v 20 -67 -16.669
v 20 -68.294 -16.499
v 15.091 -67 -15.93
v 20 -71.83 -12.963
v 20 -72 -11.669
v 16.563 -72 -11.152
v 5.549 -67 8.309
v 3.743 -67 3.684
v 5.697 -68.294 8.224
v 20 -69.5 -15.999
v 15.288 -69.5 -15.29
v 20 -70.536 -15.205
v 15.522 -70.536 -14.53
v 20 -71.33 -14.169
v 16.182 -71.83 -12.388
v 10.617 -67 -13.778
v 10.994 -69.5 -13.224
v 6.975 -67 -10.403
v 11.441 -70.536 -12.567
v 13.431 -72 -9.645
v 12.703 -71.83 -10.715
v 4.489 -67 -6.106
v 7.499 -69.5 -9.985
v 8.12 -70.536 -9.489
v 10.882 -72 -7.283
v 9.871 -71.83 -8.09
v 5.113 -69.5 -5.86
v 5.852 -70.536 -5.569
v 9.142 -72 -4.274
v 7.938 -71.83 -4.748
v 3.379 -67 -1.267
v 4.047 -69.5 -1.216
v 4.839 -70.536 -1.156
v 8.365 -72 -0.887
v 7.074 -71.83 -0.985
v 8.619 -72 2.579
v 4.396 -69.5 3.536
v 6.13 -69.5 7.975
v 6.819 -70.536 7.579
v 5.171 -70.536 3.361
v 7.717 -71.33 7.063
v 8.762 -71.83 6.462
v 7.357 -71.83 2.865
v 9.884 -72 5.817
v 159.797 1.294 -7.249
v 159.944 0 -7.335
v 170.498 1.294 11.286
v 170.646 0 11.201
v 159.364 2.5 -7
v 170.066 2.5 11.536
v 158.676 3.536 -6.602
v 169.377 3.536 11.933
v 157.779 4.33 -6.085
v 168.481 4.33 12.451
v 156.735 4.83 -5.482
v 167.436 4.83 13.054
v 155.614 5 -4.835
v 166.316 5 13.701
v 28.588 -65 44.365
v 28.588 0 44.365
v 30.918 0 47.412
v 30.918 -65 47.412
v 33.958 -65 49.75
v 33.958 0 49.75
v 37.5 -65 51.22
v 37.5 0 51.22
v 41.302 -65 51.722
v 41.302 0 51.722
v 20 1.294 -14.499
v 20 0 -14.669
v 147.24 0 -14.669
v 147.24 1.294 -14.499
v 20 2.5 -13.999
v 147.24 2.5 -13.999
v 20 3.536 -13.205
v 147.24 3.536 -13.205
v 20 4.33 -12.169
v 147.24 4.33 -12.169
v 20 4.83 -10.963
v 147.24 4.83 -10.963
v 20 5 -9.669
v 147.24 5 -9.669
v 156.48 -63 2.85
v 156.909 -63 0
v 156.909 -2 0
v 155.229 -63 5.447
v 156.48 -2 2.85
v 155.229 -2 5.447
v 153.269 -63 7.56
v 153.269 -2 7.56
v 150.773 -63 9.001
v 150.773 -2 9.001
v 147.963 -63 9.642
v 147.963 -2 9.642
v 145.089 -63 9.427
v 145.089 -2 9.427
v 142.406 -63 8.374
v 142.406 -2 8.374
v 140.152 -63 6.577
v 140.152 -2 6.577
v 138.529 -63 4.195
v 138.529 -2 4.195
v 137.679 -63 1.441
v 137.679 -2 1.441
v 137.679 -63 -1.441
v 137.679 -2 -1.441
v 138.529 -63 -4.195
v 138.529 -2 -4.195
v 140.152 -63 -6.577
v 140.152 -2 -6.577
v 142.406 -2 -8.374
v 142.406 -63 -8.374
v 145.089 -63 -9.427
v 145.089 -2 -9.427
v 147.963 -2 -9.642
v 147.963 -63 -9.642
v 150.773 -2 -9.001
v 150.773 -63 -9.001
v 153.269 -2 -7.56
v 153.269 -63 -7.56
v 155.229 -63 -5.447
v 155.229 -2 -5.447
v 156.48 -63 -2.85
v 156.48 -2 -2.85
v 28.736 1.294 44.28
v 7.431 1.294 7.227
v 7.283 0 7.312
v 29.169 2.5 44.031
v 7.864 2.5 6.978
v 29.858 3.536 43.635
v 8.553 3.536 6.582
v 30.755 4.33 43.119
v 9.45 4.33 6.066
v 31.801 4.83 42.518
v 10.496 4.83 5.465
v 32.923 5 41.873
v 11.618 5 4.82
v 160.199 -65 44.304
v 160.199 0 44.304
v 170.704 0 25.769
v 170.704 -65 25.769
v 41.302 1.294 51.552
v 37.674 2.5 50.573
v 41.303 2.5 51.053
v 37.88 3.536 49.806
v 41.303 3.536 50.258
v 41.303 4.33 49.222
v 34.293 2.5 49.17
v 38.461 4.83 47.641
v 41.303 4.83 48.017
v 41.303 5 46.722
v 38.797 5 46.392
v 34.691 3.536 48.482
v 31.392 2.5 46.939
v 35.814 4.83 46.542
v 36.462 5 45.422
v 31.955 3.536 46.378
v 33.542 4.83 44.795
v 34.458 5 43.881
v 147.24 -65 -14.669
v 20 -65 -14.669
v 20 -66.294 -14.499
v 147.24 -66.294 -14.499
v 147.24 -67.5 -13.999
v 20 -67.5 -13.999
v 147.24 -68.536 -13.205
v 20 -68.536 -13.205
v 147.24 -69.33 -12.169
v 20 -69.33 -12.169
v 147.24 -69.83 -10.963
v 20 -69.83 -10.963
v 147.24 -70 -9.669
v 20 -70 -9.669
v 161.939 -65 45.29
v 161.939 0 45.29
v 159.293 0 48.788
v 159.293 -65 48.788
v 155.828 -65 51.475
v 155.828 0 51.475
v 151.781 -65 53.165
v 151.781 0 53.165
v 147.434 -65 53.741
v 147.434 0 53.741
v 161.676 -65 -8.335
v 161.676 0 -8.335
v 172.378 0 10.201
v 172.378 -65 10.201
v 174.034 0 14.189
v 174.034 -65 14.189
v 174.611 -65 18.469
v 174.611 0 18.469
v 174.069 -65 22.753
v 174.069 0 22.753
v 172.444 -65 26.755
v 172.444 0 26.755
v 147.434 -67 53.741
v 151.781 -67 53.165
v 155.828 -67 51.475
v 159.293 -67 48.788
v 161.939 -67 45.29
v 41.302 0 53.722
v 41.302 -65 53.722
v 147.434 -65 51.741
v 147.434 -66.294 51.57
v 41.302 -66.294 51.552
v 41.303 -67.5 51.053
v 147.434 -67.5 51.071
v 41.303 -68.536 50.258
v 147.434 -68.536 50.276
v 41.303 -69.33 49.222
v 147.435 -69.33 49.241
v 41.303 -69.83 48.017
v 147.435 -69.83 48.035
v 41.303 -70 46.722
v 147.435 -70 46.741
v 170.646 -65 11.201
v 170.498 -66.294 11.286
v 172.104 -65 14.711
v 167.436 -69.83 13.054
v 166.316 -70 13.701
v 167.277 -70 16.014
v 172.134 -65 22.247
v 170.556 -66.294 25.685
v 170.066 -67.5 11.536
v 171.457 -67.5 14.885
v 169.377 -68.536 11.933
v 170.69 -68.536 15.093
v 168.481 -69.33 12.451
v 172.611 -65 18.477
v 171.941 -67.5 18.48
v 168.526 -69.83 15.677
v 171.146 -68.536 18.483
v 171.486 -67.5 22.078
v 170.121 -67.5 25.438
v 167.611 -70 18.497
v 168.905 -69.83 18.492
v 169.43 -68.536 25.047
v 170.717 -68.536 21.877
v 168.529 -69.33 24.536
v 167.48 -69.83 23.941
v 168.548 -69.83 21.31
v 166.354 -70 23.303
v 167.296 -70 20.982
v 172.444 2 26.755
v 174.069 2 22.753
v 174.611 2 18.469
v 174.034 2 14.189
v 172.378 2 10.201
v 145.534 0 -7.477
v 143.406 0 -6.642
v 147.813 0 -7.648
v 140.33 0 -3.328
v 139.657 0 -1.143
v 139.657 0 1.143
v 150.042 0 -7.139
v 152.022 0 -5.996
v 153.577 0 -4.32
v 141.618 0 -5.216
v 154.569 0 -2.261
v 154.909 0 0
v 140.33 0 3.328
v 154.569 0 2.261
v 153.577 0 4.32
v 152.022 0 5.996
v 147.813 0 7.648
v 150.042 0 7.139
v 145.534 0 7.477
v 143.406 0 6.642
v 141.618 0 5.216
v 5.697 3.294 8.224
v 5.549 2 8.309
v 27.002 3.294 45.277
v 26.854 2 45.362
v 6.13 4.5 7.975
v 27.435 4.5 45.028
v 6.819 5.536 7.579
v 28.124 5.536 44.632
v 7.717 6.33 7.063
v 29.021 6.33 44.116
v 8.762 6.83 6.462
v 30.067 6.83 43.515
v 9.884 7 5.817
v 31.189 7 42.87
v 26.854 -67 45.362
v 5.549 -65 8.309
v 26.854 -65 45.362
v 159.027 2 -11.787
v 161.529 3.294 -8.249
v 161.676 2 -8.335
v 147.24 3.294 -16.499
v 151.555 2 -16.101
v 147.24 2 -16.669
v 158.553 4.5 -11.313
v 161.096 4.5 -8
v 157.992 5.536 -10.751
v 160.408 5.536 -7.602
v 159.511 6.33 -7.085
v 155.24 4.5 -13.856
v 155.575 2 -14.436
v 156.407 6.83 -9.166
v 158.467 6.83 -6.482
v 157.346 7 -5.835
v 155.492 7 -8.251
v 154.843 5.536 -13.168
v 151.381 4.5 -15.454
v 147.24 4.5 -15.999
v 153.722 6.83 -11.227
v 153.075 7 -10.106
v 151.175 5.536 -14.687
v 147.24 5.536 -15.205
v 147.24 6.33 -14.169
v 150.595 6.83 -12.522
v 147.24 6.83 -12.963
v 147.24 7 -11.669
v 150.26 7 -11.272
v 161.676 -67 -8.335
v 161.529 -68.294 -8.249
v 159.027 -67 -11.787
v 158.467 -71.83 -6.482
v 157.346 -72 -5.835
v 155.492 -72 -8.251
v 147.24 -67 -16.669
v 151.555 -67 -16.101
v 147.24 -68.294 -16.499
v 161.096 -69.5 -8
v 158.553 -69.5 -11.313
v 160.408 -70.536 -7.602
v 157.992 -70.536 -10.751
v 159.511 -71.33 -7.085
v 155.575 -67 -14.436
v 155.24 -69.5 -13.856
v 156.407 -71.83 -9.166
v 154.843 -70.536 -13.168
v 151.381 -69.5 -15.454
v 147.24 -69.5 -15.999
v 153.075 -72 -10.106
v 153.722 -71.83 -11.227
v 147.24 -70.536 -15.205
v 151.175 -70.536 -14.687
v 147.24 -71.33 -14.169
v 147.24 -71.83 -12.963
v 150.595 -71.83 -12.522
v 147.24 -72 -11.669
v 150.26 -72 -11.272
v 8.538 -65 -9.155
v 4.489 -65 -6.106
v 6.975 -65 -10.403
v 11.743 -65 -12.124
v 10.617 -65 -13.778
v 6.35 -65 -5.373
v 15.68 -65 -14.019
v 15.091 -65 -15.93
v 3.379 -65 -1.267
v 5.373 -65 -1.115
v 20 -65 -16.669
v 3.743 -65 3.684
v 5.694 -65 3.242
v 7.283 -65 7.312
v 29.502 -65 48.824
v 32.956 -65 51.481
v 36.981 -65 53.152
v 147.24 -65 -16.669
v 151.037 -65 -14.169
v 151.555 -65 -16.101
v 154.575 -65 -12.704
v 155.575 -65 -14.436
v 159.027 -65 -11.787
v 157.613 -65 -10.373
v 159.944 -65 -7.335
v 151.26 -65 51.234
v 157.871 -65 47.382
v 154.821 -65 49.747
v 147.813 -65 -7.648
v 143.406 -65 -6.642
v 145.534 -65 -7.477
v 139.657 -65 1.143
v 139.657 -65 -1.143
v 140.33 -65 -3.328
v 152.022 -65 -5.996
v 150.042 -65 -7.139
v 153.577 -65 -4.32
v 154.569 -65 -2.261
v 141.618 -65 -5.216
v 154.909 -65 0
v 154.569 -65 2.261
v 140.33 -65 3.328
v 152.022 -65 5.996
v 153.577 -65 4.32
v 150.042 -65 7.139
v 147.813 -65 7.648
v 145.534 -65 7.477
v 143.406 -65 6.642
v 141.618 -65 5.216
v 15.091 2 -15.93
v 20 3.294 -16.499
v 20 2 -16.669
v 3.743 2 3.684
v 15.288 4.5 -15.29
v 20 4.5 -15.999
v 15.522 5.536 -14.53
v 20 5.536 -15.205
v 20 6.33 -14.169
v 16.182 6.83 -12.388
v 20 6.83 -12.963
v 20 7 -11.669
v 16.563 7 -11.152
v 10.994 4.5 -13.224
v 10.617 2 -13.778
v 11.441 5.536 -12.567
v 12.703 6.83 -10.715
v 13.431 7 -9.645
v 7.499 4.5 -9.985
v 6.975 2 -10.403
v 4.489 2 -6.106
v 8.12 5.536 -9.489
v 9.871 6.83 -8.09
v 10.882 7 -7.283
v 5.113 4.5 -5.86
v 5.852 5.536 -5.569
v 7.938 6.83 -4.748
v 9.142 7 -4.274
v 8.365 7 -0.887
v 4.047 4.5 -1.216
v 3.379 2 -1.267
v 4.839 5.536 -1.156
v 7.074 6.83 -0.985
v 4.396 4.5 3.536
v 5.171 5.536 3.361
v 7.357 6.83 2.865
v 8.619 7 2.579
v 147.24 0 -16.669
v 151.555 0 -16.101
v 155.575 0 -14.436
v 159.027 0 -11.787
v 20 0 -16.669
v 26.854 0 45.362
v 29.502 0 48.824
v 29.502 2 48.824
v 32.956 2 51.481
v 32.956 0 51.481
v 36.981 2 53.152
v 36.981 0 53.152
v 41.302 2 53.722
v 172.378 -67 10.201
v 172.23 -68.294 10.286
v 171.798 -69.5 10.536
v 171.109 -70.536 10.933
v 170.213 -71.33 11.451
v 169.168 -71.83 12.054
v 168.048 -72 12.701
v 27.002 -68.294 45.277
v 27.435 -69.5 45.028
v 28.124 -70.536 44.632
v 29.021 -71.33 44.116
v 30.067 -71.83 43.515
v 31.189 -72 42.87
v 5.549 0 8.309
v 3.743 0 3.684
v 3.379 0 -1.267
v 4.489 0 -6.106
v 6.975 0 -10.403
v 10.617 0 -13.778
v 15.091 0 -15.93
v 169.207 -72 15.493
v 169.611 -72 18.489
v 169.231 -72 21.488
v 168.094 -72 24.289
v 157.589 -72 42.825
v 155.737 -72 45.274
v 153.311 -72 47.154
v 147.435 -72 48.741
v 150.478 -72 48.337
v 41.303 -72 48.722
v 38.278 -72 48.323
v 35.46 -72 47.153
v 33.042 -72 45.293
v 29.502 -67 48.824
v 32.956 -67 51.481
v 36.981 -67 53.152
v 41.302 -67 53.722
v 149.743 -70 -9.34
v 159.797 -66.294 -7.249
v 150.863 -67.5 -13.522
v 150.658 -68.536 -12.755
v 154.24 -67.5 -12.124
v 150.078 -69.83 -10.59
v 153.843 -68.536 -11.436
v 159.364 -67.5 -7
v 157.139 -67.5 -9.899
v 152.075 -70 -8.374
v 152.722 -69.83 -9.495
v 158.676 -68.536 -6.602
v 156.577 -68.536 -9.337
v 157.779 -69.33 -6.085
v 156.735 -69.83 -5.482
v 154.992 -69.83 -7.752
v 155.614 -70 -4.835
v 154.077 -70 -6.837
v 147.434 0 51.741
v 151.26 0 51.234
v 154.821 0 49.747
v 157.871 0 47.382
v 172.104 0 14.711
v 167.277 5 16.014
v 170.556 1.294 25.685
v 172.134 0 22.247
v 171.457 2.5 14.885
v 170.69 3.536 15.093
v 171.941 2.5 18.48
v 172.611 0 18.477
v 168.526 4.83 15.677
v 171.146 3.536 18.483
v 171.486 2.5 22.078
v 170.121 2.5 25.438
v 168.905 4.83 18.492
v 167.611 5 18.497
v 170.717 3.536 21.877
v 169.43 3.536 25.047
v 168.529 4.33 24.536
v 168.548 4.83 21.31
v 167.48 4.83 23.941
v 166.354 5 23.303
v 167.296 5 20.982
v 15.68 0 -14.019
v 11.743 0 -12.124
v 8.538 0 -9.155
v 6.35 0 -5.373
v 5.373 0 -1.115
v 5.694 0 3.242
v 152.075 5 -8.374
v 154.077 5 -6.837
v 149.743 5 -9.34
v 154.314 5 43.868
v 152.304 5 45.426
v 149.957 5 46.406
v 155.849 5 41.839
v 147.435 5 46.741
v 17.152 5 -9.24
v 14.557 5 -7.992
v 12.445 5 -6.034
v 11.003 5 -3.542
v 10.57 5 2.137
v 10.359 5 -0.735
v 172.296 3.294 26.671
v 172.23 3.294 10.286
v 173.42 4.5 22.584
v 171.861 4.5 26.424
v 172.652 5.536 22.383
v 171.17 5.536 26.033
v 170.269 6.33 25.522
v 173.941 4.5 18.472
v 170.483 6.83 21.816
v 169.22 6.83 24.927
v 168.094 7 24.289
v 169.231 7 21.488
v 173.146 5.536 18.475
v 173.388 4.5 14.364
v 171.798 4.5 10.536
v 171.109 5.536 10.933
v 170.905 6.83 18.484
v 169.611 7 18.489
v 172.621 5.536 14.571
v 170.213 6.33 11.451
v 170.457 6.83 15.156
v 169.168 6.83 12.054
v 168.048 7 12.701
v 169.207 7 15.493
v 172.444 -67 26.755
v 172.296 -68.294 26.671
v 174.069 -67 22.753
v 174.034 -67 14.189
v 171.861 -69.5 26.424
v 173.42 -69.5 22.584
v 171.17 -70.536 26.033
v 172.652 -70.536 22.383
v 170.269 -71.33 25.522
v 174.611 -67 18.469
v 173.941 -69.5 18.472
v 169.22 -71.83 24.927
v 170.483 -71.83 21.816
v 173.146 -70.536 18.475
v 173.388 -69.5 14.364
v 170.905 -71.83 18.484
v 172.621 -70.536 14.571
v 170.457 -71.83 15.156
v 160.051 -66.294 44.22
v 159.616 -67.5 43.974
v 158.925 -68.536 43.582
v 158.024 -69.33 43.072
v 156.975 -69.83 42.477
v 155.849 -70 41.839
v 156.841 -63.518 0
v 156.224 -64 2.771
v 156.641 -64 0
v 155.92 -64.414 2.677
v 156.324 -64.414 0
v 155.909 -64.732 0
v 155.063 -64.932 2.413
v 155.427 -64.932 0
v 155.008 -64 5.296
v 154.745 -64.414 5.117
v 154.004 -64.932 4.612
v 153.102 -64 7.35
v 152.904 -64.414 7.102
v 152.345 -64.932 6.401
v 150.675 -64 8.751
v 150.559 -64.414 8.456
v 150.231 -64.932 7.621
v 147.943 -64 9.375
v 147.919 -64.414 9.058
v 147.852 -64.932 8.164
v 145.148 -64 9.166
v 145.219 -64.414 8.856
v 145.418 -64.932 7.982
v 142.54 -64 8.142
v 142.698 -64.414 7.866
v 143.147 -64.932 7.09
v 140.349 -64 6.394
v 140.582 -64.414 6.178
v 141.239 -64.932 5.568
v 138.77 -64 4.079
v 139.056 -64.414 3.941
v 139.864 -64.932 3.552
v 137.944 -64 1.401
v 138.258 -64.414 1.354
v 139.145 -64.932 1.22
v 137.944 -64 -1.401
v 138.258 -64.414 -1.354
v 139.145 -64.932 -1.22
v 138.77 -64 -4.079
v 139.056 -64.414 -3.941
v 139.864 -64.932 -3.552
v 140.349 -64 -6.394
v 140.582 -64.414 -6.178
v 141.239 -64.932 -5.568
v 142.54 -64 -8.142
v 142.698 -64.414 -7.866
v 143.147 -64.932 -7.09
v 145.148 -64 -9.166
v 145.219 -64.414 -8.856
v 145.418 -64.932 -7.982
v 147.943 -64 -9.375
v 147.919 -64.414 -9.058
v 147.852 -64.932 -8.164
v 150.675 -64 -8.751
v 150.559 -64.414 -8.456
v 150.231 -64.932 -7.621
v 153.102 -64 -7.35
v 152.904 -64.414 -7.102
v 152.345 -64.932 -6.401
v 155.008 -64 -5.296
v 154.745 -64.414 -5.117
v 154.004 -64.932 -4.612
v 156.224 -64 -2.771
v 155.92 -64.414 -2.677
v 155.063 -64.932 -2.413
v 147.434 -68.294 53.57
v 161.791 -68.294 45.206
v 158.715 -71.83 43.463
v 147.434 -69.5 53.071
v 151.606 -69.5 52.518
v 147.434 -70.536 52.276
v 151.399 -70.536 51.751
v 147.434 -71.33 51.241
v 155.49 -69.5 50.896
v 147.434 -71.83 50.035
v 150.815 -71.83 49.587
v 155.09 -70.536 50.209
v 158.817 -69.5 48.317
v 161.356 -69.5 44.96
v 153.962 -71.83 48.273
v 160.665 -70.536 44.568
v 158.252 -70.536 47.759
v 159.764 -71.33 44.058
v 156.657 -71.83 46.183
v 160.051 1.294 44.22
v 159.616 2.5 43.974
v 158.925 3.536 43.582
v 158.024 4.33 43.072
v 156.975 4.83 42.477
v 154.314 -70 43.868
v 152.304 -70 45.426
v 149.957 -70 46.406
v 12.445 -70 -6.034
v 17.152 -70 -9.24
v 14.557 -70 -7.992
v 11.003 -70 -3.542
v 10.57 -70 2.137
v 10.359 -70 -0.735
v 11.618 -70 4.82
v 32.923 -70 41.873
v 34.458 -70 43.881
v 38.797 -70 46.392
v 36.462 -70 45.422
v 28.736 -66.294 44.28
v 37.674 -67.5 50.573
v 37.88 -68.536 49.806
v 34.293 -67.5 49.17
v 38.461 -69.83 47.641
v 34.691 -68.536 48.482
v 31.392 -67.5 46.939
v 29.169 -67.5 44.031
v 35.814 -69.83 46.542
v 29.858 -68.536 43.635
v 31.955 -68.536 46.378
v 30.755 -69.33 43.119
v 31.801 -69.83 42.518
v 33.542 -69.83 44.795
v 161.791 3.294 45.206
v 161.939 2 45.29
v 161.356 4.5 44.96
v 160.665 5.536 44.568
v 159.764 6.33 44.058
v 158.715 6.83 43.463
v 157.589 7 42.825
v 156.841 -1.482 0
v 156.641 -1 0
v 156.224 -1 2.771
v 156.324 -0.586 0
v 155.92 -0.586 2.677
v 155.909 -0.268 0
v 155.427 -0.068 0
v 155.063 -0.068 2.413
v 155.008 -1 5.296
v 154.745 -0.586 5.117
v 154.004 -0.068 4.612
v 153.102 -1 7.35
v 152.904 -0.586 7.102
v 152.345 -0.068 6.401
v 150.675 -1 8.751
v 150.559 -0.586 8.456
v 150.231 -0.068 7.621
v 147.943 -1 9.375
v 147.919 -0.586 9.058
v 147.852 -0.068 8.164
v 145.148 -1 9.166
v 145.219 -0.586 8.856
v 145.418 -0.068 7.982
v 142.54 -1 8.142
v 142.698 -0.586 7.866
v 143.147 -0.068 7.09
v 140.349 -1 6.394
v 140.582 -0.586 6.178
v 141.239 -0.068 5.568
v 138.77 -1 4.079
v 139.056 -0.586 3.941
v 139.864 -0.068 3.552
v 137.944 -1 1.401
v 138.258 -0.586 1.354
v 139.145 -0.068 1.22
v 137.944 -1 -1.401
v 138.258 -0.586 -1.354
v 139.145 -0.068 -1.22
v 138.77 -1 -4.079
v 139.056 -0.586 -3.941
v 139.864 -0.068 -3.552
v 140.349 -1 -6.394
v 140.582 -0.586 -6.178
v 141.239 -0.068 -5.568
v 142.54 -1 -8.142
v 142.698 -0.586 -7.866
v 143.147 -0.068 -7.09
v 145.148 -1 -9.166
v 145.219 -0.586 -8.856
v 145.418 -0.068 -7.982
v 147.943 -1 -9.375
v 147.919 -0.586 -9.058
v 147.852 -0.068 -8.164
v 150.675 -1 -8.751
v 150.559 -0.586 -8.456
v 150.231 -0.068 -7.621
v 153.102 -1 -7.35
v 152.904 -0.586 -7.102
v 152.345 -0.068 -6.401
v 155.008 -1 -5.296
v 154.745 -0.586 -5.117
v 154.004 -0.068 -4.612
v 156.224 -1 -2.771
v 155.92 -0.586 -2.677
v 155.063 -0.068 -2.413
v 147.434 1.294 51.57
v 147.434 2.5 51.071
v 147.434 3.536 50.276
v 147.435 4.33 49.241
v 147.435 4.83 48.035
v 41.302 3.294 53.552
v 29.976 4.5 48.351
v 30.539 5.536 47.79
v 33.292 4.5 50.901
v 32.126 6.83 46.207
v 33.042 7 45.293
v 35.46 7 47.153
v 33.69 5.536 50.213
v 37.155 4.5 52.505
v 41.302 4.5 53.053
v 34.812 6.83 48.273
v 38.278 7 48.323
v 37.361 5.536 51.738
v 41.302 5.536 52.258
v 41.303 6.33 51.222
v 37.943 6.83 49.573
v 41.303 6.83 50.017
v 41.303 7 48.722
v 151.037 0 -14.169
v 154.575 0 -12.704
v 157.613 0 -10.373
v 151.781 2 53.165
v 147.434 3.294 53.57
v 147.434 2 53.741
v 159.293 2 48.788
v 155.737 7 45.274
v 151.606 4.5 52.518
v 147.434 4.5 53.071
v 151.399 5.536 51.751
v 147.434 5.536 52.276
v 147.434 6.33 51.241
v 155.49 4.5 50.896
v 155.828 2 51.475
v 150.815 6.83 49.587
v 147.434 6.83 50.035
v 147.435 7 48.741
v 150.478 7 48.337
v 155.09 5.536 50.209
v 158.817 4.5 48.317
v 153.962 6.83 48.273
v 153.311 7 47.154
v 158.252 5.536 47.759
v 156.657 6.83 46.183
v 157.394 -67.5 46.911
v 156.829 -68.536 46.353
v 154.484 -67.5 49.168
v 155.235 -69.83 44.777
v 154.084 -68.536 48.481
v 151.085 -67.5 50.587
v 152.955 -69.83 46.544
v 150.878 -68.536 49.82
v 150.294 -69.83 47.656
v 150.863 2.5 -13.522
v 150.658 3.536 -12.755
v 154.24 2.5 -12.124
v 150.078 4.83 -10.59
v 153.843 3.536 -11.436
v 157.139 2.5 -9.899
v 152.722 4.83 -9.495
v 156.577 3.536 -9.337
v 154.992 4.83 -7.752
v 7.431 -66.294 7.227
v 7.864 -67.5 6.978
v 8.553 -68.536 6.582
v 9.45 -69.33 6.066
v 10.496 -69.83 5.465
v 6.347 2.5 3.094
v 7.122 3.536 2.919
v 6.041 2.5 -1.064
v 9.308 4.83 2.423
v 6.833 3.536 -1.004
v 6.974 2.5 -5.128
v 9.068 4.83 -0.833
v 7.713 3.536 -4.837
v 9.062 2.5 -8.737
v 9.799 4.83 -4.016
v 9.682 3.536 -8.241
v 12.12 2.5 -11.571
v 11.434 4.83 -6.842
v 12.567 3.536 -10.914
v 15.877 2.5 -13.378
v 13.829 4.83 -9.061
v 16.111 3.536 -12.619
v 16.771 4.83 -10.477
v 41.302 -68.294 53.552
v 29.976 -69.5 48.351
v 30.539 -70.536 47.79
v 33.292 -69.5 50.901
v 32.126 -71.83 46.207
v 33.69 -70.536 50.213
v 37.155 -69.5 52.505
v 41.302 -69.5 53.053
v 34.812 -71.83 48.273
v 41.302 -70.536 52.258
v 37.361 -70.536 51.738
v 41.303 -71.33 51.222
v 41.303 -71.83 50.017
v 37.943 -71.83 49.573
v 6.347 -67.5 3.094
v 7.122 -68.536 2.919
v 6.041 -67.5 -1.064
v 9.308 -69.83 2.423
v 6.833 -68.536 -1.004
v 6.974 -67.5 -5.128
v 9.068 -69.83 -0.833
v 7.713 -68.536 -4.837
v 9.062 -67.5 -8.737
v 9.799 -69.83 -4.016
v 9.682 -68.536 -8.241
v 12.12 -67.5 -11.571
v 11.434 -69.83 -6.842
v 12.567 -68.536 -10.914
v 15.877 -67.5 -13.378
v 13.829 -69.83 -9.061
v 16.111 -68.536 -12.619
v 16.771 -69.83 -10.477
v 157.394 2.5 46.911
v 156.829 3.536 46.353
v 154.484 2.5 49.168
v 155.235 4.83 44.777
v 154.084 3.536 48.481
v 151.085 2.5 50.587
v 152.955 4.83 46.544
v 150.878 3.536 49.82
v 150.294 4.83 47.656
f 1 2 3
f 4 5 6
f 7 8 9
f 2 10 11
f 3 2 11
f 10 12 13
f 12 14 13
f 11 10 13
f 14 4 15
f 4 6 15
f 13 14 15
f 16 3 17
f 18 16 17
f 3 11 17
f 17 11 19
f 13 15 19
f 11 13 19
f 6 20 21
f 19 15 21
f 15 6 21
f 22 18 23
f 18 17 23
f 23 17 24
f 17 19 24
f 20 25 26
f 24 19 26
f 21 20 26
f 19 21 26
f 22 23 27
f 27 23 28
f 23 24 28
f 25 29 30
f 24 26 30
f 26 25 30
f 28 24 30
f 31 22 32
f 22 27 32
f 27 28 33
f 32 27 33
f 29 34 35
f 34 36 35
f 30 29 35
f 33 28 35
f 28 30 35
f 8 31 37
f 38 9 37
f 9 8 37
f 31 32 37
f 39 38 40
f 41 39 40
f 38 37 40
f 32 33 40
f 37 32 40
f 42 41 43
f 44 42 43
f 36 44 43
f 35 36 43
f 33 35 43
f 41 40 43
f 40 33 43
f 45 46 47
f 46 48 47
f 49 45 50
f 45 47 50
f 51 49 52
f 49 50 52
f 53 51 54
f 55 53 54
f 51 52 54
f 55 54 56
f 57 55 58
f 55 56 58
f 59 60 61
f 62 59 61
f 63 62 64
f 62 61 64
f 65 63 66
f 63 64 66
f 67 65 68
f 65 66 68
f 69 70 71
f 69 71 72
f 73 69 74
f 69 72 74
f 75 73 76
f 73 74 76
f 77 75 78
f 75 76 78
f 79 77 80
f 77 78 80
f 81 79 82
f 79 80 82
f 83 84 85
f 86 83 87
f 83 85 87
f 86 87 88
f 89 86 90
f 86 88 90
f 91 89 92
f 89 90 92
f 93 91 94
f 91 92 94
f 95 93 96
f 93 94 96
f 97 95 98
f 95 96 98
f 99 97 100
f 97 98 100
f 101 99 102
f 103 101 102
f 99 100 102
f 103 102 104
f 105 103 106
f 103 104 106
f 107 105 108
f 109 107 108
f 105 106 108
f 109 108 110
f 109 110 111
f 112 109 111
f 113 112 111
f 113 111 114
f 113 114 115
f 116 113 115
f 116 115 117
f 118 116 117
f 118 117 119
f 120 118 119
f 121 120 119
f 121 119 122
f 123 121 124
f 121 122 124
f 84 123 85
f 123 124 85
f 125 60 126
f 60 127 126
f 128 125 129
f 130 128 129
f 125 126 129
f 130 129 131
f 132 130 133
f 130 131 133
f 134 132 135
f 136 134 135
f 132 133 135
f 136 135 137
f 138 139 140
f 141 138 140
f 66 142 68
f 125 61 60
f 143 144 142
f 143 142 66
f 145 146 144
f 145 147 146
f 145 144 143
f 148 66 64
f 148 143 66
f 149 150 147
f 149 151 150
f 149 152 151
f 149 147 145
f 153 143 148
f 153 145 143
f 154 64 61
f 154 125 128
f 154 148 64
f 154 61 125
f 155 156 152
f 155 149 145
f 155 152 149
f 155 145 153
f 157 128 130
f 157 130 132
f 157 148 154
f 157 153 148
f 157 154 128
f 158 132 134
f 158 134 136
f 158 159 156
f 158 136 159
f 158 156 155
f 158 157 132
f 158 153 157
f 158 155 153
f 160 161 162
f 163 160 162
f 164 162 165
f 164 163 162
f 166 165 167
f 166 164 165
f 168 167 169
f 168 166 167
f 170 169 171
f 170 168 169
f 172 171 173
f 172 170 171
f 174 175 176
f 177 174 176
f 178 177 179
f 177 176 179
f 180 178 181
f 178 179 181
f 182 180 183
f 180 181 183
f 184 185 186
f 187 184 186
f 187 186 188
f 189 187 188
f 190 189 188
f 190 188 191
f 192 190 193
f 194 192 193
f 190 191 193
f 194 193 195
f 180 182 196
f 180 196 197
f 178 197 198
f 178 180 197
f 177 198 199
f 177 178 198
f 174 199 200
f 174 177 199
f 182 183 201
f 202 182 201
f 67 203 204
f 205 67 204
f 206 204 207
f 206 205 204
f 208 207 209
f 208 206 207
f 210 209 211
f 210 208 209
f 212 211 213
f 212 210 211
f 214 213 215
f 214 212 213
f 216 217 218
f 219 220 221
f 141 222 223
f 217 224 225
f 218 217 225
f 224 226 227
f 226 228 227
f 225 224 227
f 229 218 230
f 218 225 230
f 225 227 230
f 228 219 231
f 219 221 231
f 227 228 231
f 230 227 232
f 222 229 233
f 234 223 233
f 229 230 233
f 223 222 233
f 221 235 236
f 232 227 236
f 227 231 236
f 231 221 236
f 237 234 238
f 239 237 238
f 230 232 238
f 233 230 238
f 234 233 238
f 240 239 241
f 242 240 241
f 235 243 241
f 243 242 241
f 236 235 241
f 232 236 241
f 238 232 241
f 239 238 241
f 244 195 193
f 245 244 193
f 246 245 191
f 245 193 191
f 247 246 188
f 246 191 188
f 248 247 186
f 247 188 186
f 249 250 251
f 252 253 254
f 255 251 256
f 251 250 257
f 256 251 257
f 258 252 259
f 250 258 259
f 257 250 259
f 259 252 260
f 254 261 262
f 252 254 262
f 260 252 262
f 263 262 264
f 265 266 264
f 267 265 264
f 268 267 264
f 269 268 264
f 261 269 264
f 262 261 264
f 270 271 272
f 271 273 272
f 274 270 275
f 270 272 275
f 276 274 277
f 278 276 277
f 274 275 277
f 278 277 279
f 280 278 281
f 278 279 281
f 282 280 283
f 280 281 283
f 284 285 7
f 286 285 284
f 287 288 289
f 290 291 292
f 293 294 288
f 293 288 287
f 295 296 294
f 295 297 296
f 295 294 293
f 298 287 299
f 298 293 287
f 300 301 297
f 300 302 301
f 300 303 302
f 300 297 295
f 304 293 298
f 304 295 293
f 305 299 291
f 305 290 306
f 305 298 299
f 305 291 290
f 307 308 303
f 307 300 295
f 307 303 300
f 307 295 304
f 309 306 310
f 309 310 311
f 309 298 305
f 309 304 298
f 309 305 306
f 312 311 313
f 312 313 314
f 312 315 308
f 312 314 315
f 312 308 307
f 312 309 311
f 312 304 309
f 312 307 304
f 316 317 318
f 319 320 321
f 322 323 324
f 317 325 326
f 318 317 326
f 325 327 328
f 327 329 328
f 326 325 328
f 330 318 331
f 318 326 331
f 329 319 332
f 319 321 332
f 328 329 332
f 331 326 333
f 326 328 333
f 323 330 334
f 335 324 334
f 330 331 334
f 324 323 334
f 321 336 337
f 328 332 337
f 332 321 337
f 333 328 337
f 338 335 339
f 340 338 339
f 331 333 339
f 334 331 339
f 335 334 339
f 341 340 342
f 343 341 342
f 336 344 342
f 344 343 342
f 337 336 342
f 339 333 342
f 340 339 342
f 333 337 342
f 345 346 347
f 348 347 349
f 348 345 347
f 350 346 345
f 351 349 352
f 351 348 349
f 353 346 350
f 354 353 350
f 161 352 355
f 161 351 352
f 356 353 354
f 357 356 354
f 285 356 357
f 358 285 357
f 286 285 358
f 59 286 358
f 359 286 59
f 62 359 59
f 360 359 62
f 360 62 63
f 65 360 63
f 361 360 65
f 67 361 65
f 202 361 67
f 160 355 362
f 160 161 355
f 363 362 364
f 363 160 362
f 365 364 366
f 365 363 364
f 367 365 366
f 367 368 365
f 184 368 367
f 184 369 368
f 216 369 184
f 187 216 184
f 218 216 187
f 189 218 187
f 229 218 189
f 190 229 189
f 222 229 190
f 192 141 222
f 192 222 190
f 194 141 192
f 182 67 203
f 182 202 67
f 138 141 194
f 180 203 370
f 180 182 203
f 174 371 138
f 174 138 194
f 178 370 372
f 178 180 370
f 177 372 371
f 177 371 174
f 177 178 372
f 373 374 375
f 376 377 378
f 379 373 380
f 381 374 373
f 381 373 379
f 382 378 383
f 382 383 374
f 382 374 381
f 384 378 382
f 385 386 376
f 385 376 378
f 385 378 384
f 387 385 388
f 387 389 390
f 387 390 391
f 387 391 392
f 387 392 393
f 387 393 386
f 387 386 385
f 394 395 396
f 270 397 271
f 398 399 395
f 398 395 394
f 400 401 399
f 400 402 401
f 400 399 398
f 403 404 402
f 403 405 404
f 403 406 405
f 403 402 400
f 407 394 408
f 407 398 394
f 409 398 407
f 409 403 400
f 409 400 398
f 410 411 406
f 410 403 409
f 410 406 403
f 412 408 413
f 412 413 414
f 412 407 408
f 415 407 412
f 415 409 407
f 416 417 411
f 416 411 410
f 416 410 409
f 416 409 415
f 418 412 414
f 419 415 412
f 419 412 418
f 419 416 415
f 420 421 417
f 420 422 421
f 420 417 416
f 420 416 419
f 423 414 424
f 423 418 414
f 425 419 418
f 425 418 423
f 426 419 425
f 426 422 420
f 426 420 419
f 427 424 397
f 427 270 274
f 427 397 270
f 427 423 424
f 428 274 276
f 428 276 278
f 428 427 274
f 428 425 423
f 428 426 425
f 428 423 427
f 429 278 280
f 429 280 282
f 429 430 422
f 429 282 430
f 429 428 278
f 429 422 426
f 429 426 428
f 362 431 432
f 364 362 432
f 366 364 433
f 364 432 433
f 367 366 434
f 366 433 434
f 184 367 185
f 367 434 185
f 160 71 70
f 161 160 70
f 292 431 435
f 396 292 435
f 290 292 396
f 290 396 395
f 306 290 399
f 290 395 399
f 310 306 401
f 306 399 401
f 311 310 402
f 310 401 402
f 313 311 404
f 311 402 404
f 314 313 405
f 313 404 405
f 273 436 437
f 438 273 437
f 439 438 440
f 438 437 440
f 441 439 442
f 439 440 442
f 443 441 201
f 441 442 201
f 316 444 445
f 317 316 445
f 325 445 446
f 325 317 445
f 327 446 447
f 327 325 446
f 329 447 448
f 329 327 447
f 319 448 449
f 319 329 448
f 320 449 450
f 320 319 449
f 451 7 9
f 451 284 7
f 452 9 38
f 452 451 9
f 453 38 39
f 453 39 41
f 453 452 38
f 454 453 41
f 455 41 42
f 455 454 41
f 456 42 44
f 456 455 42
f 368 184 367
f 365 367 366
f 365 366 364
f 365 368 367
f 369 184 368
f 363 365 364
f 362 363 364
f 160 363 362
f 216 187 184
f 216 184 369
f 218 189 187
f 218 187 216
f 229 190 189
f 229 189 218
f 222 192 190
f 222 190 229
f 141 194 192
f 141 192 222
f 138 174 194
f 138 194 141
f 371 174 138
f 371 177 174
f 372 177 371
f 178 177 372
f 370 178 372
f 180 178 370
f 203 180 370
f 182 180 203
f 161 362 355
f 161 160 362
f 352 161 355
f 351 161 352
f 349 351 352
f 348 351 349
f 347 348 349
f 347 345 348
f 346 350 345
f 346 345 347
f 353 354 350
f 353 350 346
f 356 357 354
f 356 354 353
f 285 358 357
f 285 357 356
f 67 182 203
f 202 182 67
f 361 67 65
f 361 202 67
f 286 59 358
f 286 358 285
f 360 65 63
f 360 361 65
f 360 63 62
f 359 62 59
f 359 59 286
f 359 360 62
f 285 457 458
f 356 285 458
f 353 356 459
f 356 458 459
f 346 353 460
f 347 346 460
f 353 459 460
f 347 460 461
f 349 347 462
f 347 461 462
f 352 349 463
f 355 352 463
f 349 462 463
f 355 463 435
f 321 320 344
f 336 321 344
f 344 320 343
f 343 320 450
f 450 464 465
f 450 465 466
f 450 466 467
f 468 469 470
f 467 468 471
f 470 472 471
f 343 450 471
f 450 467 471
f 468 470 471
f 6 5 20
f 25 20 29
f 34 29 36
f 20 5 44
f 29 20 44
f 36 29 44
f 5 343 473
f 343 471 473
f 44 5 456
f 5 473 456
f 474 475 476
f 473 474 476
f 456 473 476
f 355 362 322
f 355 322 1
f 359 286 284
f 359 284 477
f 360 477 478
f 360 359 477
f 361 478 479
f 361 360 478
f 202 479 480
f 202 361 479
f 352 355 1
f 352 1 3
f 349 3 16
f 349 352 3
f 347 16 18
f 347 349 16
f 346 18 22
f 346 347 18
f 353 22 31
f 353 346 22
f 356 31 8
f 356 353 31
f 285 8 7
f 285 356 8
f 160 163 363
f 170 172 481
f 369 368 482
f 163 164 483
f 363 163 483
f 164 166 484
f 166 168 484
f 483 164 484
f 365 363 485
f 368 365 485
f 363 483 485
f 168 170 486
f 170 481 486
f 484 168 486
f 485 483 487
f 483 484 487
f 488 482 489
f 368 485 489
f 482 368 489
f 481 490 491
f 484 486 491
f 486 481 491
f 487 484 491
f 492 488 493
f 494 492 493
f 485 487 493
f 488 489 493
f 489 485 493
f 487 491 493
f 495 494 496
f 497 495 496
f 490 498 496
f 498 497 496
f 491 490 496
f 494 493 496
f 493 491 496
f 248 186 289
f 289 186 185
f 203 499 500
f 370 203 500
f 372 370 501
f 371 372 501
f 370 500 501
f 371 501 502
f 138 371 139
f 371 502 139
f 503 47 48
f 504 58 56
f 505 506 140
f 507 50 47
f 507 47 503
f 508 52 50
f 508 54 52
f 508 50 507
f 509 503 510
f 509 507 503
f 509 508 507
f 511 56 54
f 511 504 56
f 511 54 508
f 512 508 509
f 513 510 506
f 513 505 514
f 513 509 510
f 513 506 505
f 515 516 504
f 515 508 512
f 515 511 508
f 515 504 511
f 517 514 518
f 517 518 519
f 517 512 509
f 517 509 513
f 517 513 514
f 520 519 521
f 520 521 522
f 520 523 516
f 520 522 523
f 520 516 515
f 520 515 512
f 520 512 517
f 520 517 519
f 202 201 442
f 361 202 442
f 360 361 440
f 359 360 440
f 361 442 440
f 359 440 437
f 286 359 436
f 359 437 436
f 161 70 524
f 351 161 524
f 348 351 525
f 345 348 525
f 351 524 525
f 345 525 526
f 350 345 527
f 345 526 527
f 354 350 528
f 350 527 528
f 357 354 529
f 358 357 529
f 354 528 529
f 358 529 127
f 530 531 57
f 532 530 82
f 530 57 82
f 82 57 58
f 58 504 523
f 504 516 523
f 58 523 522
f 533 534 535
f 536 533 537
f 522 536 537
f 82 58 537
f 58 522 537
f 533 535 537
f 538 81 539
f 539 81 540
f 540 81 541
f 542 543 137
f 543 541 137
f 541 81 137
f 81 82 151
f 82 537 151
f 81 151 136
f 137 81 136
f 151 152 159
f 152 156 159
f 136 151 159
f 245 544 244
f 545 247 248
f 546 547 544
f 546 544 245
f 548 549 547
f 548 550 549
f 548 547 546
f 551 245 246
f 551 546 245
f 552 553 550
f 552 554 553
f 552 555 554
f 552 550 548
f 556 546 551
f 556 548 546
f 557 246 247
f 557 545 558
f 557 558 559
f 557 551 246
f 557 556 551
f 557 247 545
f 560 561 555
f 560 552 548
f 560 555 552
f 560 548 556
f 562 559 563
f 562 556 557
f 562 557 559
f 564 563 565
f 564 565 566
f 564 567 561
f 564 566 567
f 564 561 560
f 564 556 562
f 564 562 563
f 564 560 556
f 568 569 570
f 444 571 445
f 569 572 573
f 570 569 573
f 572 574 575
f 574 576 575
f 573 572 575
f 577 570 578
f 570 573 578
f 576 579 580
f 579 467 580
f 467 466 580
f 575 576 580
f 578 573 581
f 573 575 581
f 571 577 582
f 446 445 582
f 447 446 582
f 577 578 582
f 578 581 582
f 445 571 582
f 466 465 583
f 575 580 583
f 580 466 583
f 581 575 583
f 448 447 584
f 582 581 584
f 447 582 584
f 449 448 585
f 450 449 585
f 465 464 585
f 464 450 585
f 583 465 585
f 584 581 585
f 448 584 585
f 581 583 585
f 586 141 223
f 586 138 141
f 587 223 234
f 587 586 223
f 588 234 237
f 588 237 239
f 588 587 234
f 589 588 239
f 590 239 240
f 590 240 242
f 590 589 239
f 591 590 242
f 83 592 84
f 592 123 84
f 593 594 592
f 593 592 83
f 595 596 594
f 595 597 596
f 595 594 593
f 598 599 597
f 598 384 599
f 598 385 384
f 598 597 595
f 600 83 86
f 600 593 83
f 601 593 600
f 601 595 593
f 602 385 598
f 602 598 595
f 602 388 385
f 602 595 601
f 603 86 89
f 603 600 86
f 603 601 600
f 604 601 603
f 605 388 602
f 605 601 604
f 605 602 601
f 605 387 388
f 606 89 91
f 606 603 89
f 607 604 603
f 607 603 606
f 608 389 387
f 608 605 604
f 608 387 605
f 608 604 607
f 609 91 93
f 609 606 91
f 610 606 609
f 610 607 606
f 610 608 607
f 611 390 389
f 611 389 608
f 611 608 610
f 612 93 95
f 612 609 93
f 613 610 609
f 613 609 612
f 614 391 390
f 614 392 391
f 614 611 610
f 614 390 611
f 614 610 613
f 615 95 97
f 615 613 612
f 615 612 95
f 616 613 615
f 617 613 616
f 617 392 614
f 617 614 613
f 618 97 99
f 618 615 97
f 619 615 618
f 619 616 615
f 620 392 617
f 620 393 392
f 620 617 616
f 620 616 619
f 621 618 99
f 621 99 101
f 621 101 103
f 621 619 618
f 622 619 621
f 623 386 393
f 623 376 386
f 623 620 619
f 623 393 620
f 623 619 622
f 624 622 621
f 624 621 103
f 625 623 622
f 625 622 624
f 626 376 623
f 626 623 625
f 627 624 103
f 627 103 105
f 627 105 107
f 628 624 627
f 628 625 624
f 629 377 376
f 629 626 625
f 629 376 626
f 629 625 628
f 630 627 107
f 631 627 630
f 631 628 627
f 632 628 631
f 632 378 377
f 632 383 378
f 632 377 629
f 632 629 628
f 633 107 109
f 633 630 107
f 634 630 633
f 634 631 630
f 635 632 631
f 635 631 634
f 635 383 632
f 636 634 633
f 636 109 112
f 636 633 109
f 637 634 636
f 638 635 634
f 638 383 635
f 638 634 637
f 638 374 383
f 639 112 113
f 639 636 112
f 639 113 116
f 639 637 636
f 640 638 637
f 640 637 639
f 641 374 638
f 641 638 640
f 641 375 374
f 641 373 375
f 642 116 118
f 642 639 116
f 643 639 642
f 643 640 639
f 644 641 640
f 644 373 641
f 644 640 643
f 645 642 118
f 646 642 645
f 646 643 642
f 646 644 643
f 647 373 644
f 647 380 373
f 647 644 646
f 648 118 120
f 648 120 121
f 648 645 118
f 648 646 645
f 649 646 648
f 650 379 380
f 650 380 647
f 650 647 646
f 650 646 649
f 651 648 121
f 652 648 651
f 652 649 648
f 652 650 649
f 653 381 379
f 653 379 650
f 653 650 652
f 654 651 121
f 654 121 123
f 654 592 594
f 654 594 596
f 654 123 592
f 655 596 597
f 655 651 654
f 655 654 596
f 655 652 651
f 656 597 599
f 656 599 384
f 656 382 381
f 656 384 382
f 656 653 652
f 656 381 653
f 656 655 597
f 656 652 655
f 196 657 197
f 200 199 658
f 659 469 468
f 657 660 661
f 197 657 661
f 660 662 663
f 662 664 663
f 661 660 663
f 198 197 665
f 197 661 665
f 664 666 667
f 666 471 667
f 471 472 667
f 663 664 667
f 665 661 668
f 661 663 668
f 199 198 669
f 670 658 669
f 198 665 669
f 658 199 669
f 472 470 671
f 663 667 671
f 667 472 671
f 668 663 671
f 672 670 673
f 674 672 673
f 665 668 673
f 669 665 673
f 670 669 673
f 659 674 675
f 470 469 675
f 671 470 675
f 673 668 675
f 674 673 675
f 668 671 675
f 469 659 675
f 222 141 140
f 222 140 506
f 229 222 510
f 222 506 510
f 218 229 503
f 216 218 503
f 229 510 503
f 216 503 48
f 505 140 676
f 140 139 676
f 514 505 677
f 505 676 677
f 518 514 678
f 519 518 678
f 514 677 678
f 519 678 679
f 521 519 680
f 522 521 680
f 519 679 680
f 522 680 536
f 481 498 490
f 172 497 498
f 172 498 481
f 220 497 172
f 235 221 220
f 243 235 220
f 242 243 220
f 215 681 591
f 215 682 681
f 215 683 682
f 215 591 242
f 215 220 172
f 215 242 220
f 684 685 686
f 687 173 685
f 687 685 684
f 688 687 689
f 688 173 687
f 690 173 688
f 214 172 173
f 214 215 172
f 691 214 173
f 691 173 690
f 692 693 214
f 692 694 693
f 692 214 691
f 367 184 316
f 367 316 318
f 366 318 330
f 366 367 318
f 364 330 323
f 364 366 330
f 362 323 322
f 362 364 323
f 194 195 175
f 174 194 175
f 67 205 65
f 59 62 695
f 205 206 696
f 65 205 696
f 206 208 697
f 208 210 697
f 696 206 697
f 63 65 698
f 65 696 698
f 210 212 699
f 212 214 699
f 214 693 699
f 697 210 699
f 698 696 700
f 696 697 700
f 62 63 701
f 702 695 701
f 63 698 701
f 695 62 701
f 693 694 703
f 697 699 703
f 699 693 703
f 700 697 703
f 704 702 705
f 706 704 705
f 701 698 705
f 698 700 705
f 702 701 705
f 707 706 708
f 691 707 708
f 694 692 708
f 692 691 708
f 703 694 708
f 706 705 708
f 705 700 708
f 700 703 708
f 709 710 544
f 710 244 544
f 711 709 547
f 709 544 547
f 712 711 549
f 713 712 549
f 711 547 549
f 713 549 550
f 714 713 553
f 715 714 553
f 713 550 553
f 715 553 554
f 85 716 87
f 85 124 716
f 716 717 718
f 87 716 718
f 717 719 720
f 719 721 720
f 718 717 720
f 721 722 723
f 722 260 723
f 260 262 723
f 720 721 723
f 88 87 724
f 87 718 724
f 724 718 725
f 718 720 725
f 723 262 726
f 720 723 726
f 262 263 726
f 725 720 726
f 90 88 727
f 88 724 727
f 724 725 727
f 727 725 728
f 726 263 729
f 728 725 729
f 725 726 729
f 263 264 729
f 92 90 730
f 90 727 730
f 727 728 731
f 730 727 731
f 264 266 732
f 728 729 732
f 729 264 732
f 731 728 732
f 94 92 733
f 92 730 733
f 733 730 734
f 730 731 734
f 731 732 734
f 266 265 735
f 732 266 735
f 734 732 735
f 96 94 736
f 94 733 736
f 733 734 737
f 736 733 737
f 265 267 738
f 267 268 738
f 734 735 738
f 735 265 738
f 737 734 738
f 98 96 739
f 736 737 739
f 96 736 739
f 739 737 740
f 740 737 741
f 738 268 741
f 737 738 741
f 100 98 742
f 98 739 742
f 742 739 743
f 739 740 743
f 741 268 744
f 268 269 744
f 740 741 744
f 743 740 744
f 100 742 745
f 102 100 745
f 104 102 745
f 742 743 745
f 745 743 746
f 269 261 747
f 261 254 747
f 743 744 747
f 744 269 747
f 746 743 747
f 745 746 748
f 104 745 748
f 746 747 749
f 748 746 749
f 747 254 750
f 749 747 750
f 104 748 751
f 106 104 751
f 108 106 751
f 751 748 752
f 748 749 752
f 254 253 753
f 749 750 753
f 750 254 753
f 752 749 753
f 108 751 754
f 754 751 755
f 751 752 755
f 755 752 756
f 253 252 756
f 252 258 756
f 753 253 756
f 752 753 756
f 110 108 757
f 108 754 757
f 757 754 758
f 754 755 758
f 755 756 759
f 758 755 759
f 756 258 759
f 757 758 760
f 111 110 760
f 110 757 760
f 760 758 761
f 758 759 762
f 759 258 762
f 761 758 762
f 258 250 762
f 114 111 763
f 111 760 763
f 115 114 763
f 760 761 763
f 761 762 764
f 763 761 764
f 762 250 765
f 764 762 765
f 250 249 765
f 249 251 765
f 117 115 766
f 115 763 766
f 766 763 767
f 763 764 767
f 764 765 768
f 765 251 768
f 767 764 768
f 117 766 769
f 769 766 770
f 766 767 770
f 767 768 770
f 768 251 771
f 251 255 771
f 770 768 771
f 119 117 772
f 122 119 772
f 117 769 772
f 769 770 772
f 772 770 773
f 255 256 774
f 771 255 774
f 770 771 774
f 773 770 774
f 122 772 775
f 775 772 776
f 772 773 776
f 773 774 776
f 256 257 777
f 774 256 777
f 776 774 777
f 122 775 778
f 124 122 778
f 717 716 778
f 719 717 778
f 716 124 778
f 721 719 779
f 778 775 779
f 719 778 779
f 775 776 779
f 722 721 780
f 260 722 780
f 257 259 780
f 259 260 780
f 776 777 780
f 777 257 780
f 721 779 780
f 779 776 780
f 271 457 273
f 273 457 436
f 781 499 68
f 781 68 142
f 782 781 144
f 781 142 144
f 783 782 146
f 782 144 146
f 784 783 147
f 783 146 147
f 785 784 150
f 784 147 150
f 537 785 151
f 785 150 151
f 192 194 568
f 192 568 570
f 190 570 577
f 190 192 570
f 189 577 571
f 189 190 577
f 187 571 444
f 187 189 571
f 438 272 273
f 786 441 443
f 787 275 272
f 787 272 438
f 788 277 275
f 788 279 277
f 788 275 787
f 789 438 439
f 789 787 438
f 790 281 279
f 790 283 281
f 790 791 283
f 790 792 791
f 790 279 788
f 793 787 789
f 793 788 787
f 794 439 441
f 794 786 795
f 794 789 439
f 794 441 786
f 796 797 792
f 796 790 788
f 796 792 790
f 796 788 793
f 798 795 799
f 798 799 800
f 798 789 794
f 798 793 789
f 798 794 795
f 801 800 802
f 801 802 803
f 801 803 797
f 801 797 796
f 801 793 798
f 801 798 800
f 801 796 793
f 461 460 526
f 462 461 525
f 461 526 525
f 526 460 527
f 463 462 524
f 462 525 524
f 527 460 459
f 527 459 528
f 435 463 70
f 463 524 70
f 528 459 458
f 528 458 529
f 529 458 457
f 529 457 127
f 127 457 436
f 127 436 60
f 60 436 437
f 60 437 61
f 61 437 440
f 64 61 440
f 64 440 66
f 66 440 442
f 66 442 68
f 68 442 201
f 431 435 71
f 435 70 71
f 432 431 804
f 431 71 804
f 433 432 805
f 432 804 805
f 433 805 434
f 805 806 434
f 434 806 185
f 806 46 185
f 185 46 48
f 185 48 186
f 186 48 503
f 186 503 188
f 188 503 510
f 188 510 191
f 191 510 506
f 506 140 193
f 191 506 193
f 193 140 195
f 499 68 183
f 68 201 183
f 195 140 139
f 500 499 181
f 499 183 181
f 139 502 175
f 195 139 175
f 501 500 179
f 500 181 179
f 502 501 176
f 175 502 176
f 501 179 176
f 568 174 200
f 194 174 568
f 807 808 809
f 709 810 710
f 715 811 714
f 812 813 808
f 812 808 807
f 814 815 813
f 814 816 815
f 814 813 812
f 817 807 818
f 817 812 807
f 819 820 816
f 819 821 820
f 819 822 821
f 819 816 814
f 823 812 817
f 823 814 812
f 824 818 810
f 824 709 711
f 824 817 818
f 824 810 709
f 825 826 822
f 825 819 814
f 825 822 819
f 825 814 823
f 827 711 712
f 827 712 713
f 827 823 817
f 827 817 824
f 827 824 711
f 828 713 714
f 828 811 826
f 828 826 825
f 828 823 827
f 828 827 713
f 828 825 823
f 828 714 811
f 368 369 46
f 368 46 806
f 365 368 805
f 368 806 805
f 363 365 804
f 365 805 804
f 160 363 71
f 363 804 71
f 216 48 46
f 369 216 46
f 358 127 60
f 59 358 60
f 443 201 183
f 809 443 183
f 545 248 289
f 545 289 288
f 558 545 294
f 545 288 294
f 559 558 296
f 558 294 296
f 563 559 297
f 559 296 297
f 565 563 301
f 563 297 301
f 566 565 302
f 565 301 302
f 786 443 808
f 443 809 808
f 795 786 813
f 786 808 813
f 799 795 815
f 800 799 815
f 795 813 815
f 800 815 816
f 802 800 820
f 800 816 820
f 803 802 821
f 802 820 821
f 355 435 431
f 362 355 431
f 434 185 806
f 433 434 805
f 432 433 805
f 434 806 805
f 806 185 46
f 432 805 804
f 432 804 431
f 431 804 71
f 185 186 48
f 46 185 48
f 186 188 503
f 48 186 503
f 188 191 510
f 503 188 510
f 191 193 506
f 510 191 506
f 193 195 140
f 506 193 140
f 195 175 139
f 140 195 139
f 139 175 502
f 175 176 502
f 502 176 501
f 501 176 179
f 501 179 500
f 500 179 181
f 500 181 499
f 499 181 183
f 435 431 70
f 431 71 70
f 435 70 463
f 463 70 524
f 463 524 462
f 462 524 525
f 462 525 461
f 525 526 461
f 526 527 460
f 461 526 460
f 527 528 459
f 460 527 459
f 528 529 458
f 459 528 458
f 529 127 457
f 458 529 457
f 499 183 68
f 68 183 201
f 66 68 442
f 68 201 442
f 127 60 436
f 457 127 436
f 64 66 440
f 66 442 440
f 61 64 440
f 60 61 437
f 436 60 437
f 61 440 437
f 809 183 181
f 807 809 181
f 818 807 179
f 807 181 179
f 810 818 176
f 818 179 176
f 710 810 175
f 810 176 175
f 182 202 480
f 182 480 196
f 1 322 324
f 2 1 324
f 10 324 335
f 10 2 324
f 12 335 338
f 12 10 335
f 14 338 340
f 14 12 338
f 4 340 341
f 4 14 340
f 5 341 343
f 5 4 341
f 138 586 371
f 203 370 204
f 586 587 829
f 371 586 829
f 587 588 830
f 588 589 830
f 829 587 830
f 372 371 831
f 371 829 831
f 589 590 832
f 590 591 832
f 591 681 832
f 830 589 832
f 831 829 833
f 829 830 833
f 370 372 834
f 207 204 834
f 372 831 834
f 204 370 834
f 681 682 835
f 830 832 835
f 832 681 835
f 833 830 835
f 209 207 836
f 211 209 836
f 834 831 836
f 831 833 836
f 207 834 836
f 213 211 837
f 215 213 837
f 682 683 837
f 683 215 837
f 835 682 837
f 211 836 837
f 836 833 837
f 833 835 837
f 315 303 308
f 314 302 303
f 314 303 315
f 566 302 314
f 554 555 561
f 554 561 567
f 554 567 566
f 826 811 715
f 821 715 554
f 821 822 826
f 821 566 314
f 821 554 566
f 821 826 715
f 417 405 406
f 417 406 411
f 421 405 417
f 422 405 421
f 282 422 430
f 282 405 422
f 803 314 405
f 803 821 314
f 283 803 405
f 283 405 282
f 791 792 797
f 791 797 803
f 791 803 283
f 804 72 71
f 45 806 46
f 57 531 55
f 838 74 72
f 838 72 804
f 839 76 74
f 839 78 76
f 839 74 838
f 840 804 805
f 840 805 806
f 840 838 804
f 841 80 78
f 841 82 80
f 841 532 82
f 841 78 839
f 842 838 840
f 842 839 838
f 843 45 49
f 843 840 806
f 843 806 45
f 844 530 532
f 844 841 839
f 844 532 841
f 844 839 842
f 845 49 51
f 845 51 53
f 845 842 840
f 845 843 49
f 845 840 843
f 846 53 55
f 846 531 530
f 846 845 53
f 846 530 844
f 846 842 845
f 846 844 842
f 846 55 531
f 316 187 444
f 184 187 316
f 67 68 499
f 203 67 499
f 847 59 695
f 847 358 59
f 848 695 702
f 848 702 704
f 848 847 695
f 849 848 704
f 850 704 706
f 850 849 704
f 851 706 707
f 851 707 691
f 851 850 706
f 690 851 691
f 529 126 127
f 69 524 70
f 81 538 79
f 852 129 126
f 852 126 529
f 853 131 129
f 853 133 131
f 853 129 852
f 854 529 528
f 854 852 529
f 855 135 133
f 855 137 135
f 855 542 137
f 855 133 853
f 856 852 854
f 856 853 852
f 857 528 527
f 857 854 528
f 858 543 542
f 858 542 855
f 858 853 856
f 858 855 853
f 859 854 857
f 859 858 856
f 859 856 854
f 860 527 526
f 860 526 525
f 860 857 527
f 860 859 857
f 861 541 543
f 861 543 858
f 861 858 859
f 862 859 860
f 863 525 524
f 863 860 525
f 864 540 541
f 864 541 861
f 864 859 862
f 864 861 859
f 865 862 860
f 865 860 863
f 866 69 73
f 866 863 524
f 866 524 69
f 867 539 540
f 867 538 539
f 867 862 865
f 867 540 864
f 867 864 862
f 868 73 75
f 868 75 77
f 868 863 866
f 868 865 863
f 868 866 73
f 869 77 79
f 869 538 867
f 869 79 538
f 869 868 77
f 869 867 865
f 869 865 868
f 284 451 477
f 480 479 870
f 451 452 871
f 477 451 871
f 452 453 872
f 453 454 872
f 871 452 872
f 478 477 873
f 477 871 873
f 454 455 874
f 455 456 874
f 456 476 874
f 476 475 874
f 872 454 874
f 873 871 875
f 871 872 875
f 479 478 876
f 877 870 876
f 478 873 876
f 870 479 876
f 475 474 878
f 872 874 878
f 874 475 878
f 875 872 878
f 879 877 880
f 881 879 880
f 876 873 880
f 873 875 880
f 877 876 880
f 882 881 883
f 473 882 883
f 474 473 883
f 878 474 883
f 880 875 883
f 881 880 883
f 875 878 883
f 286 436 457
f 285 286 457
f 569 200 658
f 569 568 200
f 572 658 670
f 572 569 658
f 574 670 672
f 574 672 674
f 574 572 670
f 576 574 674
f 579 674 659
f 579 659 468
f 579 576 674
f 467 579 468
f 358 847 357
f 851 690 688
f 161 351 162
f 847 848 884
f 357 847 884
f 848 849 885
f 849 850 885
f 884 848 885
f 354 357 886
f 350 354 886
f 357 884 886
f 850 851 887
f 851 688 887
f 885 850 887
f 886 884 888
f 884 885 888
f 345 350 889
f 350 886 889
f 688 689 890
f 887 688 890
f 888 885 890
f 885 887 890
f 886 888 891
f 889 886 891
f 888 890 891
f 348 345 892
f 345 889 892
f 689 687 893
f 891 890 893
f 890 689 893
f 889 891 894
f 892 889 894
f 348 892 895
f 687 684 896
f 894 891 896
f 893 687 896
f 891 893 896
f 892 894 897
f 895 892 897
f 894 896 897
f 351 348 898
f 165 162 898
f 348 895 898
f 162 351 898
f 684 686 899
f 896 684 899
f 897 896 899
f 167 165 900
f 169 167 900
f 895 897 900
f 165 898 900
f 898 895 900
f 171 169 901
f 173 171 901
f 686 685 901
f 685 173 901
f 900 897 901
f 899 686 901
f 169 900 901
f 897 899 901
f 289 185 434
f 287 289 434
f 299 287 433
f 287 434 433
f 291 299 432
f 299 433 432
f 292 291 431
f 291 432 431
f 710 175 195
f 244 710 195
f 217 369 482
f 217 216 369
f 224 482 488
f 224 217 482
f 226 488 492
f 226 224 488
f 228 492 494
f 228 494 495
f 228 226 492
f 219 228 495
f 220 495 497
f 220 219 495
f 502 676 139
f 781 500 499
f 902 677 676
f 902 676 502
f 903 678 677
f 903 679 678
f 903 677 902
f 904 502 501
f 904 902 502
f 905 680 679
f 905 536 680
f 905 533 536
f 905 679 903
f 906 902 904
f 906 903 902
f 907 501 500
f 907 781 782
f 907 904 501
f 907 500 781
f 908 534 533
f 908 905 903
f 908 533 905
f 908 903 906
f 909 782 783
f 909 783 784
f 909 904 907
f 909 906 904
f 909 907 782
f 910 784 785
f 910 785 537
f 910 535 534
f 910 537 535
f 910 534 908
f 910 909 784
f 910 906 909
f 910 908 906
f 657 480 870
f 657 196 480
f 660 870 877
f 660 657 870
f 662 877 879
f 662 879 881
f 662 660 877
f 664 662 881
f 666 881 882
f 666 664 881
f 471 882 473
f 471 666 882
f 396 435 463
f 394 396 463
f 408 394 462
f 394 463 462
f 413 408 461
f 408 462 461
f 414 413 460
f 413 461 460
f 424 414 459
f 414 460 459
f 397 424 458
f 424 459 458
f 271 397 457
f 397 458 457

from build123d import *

# Parameters (mm, degrees)
F2_DEPTH = 65
F0_R     = 9.6692195179
F3_DEPTH = 65
F4_R     = 2
F6_DEPTH = 5
F8_DEPTH = 2
F9_R     = 5
F10_R    = 4.99999


# Not quite as in the source:
# - a fillet or chamfer is up to 0.001 mm smaller than in the source, because OpenCascade refuses the exact size


with BuildPart() as f2:
    # F1 (on Front) → F2 (new body)
    with BuildSketch(Plane.XZ):
        with BuildLine():
            Line((147.4338146996, 53.7406046613), (41.3020801363, 53.7224159943))
            ThreePointArc((41.3020801363, 53.7224159943), (32.9562626309, 51.4810350091), (26.8541756584, 45.3621304392))
            Line((26.8541756584, 45.3621304392), (5.5492387811, 8.308933718))
            ThreePointArc((5.5492387811, 8.308933718), (5.5714463746, -8.3474379072), (20, -16.6692195179))
            Line((20, -16.6692195179), (147.2401965291, -16.6692195179))
            ThreePointArc((147.2401965291, -16.6692195179), (155.574806288, -14.4359675638), (161.6761640928, -8.3346097589))
            Line((161.6761640928, -8.3346097589), (172.3777512594, 10.2010829351))
            ThreePointArc((172.3777512594, 10.2010829351), (174.6108703147, 18.4691297742), (172.4438532753, 26.7547472165))
            Line((172.4438532753, 26.7547472165), (161.9387410203, 45.2904399106))
            ThreePointArc((161.9387410203, 45.2904399106), (155.8276257555, 51.4746754645), (147.4338146996, 53.7406046613))
        make_face()
        with BuildLine():
            ThreePointArc((28.5880014327, 44.3652110923), (33.9579501109, 49.7499595653), (41.3024228927, 51.7224160237))
            Line((41.3024228927, 51.7224160237), (147.4341574561, 51.7406046906))
            ThreePointArc((147.4341574561, 51.7406046906), (154.8208654442, 49.7465453549), (160.1987591856, 44.3043044153))
            Line((160.1987591856, 44.3043044153), (170.7038714406, 25.7686117212))
            ThreePointArc((170.7038714406, 25.7686117212), (172.6108862601, 18.4771161013), (170.6457004518, 11.2010829351))
            Line((170.6457004518, 11.2010829351), (159.9441132852, -7.3346097589))
            ThreePointArc((159.9441132852, -7.3346097589), (154.574806288, -12.7039167562), (147.2401965291, -14.6692195179))
            Line((147.2401965291, -14.6692195179), (20, -14.6692195179))
            ThreePointArc((20, -14.6692195179), (7.3026076458, -7.3458987652), (7.2830645554, 7.3120143711))
            Line((7.2830645554, 7.3120143711), (28.5880014327, 44.3652110923))
        make_face(mode=Mode.SUBTRACT)
    extrude(amount=F2_DEPTH)


with BuildPart() as f3:
    # F0 (on Front) → F3 (new body)
    with BuildSketch(Plane.XZ):
        with Locations((147.2401965291, 0)):
            Circle(F0_R)
    extrude(amount=F3_DEPTH)

    # F4
    f4_edges = [f3.edges().sort_by_distance(p)[0] for p in [
        (137.570977, -65, 0),
        (137.570977, 0, 0),
    ]]
    fillet(f4_edges, radius=F4_R)


with BuildPart() as f6:
    # F5 (on face) → F6 (new body)
    with BuildSketch(Plane(origin=(0, 0, 0), x_dir=(-1, 0, 0), z_dir=(0, 1, 0))):
        with BuildLine():
            Line((-172.3777512594, 10.2010829351), (-161.6761640928, -8.3346097589))
            ThreePointArc((-161.6761640928, -8.3346097589), (-155.574806288, -14.4359675638), (-147.2401965291, -16.6692195179))
            Line((-147.2401965291, -16.6692195179), (-20, -16.6692195179))
            ThreePointArc((-20, -16.6692195179), (-5.5714463746, -8.3474379072), (-5.5492387811, 8.308933718))
            Line((-5.5492387811, 8.308933718), (-26.8541756584, 45.3621304392))
            ThreePointArc((-26.8541756584, 45.3621304392), (-32.9562626309, 51.4810350091), (-41.3020801363, 53.7224159943))
            Line((-41.3020801363, 53.7224159943), (-147.4338146996, 53.7406046613))
            ThreePointArc((-147.4338146996, 53.7406046613), (-155.8276257555, 51.4746754645), (-161.9387410203, 45.2904399106))
            Line((-161.9387410203, 45.2904399106), (-172.4438532753, 26.7547472165))
            ThreePointArc((-172.4438532753, 26.7547472165), (-174.6108703147, 18.4691297742), (-172.3777512594, 10.2010829351))
        make_face()
        with BuildLine():
            ThreePointArc((-7.2830645554, 7.3120143711), (-7.3026076458, -7.3458987652), (-20, -14.6692195179))
            Line((-20, -14.6692195179), (-147.2401965291, -14.6692195179))
            ThreePointArc((-147.2401965291, -14.6692195179), (-154.574806288, -12.7039167562), (-159.9441132852, -7.3346097589))
            Line((-159.9441132852, -7.3346097589), (-170.6457004518, 11.2010829351))
            ThreePointArc((-170.6457004518, 11.2010829351), (-172.6108862601, 18.4771161013), (-170.7038714406, 25.7686117212))
            Line((-170.7038714406, 25.7686117212), (-160.1987591856, 44.3043044153))
            ThreePointArc((-160.1987591856, 44.3043044153), (-154.8208654442, 49.7465453549), (-147.4341574561, 51.7406046906))
            Line((-147.4341574561, 51.7406046906), (-41.3024228927, 51.7224160237))
            ThreePointArc((-41.3024228927, 51.7224160237), (-33.9579501109, 49.7499595653), (-28.5880014327, 44.3652110923))
            Line((-28.5880014327, 44.3652110923), (-7.2830645554, 7.3120143711))
        make_face(mode=Mode.SUBTRACT)
    extrude(amount=F6_DEPTH)

    # F7 (on face) → F8 (join)
    with BuildSketch(Plane(origin=(0, 5, 0), x_dir=(-1, 0, 0), z_dir=(0, 1, 0))):
        with BuildLine():
            Line((-172.3777512594, 10.2010829351), (-161.6761640928, -8.3346097589))
            ThreePointArc((-161.6761640928, -8.3346097589), (-155.574806288, -14.4359675638), (-147.2401965291, -16.6692195179))
            Line((-147.2401965291, -16.6692195179), (-20, -16.6692195179))
            ThreePointArc((-20, -16.6692195179), (-5.5714463746, -8.3474379072), (-5.5492387811, 8.308933718))
            Line((-5.5492387811, 8.308933718), (-26.8541756584, 45.3621304392))
            ThreePointArc((-26.8541756584, 45.3621304392), (-32.9562626309, 51.4810350091), (-41.3020801363, 53.7224159943))
            Line((-41.3020801363, 53.7224159943), (-147.4338146996, 53.7406046613))
            ThreePointArc((-147.4338146996, 53.7406046613), (-155.8276257555, 51.4746754645), (-161.9387410203, 45.2904399106))
            Line((-161.9387410203, 45.2904399106), (-172.4438532753, 26.7547472165))
            ThreePointArc((-172.4438532753, 26.7547472165), (-174.6108703147, 18.4691297742), (-172.3777512594, 10.2010829351))
        make_face()
    extrude(amount=F8_DEPTH)

    # F9
    f9_edges = [f6.edges().sort_by_distance(p)[0] for p in [
        (167.191297, 7, 36.022594),
        (174.61087, 7, 18.46913),
        (167.026958, 7, 0.933237),
        (155.574806, 7, -14.435968),
        (83.620098, 7, -16.66922),
        (5.571446, 7, -8.347438),
        (16.201707, 7, 26.835532),
        (32.956263, 7, 51.481035),
        (94.367947, 7, 53.73151),
        (155.827626, 7, 51.474675),
    ]]
    fillet(f9_edges, radius=F9_R)

    # F10 (radius 5 in the source; OpenCascade refuses exactly that, so slightly less here)
    f10_edges = [f6.edges().sort_by_distance(p)[0] for p in [
        (33.95795, 5, 49.74996),
        (17.935533, 5, 25.838613),
        (7.302608, 5, -7.345899),
        (83.620098, 5, -14.66922),
        (154.574806, 5, -12.703917),
        (165.294907, 5, 1.933237),
        (172.610886, 5, 18.477116),
        (165.451315, 5, 35.036458),
        (154.820865, 5, 49.746545),
        (94.36829, 5, 51.73151),
    ]]
    fillet(f10_edges, radius=F10_R)


with BuildPart() as f12_1:
    # F12: instance of F6
    add(f6.part.mirror(Plane.XZ.offset(32.5)))


solid = Compound([f2.part, f3.part, f6.part, f12_1.part])
